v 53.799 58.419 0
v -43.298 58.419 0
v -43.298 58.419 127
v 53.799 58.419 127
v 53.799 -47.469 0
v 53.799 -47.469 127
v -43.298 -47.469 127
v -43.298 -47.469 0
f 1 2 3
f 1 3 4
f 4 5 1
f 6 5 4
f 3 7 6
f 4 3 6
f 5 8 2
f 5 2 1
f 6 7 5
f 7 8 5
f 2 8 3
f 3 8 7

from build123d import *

# Parameters (mm, degrees)
F0_W     = 97.0965474844
F0_H     = 105.8883592486
F1_DEPTH = 50.8
F2_W     = 97.0965474844
F2_H     = 105.8883592486
F3_DEPTH = 76.2
F4_DEPTH = 50.8


with BuildPart() as f1:
    # F0 (on Top) → F1 (new body)
    with BuildSketch(Plane.XY):
        with Locations((5.2505135536, 5.4748691618)):
            Rectangle(F0_W, F0_H)
    extrude(amount=F1_DEPTH)

    # F2 (on face) → F3 (join)
    with BuildSketch(Plane.XY.offset(50.8)):
        with Locations((5.2505135536, 5.4748691618)):
            Rectangle(F2_W, F2_H)
    extrude(amount=F3_DEPTH)

    # F4 (add): a face of the model
    f4_faces = [f1.faces().sort_by_distance(p)[0] for p in [
        (5.2505135536, -47.4693104625, 63.5),
    ]]
    extrude(f4_faces, amount=-F4_DEPTH)


solid = f1.part
